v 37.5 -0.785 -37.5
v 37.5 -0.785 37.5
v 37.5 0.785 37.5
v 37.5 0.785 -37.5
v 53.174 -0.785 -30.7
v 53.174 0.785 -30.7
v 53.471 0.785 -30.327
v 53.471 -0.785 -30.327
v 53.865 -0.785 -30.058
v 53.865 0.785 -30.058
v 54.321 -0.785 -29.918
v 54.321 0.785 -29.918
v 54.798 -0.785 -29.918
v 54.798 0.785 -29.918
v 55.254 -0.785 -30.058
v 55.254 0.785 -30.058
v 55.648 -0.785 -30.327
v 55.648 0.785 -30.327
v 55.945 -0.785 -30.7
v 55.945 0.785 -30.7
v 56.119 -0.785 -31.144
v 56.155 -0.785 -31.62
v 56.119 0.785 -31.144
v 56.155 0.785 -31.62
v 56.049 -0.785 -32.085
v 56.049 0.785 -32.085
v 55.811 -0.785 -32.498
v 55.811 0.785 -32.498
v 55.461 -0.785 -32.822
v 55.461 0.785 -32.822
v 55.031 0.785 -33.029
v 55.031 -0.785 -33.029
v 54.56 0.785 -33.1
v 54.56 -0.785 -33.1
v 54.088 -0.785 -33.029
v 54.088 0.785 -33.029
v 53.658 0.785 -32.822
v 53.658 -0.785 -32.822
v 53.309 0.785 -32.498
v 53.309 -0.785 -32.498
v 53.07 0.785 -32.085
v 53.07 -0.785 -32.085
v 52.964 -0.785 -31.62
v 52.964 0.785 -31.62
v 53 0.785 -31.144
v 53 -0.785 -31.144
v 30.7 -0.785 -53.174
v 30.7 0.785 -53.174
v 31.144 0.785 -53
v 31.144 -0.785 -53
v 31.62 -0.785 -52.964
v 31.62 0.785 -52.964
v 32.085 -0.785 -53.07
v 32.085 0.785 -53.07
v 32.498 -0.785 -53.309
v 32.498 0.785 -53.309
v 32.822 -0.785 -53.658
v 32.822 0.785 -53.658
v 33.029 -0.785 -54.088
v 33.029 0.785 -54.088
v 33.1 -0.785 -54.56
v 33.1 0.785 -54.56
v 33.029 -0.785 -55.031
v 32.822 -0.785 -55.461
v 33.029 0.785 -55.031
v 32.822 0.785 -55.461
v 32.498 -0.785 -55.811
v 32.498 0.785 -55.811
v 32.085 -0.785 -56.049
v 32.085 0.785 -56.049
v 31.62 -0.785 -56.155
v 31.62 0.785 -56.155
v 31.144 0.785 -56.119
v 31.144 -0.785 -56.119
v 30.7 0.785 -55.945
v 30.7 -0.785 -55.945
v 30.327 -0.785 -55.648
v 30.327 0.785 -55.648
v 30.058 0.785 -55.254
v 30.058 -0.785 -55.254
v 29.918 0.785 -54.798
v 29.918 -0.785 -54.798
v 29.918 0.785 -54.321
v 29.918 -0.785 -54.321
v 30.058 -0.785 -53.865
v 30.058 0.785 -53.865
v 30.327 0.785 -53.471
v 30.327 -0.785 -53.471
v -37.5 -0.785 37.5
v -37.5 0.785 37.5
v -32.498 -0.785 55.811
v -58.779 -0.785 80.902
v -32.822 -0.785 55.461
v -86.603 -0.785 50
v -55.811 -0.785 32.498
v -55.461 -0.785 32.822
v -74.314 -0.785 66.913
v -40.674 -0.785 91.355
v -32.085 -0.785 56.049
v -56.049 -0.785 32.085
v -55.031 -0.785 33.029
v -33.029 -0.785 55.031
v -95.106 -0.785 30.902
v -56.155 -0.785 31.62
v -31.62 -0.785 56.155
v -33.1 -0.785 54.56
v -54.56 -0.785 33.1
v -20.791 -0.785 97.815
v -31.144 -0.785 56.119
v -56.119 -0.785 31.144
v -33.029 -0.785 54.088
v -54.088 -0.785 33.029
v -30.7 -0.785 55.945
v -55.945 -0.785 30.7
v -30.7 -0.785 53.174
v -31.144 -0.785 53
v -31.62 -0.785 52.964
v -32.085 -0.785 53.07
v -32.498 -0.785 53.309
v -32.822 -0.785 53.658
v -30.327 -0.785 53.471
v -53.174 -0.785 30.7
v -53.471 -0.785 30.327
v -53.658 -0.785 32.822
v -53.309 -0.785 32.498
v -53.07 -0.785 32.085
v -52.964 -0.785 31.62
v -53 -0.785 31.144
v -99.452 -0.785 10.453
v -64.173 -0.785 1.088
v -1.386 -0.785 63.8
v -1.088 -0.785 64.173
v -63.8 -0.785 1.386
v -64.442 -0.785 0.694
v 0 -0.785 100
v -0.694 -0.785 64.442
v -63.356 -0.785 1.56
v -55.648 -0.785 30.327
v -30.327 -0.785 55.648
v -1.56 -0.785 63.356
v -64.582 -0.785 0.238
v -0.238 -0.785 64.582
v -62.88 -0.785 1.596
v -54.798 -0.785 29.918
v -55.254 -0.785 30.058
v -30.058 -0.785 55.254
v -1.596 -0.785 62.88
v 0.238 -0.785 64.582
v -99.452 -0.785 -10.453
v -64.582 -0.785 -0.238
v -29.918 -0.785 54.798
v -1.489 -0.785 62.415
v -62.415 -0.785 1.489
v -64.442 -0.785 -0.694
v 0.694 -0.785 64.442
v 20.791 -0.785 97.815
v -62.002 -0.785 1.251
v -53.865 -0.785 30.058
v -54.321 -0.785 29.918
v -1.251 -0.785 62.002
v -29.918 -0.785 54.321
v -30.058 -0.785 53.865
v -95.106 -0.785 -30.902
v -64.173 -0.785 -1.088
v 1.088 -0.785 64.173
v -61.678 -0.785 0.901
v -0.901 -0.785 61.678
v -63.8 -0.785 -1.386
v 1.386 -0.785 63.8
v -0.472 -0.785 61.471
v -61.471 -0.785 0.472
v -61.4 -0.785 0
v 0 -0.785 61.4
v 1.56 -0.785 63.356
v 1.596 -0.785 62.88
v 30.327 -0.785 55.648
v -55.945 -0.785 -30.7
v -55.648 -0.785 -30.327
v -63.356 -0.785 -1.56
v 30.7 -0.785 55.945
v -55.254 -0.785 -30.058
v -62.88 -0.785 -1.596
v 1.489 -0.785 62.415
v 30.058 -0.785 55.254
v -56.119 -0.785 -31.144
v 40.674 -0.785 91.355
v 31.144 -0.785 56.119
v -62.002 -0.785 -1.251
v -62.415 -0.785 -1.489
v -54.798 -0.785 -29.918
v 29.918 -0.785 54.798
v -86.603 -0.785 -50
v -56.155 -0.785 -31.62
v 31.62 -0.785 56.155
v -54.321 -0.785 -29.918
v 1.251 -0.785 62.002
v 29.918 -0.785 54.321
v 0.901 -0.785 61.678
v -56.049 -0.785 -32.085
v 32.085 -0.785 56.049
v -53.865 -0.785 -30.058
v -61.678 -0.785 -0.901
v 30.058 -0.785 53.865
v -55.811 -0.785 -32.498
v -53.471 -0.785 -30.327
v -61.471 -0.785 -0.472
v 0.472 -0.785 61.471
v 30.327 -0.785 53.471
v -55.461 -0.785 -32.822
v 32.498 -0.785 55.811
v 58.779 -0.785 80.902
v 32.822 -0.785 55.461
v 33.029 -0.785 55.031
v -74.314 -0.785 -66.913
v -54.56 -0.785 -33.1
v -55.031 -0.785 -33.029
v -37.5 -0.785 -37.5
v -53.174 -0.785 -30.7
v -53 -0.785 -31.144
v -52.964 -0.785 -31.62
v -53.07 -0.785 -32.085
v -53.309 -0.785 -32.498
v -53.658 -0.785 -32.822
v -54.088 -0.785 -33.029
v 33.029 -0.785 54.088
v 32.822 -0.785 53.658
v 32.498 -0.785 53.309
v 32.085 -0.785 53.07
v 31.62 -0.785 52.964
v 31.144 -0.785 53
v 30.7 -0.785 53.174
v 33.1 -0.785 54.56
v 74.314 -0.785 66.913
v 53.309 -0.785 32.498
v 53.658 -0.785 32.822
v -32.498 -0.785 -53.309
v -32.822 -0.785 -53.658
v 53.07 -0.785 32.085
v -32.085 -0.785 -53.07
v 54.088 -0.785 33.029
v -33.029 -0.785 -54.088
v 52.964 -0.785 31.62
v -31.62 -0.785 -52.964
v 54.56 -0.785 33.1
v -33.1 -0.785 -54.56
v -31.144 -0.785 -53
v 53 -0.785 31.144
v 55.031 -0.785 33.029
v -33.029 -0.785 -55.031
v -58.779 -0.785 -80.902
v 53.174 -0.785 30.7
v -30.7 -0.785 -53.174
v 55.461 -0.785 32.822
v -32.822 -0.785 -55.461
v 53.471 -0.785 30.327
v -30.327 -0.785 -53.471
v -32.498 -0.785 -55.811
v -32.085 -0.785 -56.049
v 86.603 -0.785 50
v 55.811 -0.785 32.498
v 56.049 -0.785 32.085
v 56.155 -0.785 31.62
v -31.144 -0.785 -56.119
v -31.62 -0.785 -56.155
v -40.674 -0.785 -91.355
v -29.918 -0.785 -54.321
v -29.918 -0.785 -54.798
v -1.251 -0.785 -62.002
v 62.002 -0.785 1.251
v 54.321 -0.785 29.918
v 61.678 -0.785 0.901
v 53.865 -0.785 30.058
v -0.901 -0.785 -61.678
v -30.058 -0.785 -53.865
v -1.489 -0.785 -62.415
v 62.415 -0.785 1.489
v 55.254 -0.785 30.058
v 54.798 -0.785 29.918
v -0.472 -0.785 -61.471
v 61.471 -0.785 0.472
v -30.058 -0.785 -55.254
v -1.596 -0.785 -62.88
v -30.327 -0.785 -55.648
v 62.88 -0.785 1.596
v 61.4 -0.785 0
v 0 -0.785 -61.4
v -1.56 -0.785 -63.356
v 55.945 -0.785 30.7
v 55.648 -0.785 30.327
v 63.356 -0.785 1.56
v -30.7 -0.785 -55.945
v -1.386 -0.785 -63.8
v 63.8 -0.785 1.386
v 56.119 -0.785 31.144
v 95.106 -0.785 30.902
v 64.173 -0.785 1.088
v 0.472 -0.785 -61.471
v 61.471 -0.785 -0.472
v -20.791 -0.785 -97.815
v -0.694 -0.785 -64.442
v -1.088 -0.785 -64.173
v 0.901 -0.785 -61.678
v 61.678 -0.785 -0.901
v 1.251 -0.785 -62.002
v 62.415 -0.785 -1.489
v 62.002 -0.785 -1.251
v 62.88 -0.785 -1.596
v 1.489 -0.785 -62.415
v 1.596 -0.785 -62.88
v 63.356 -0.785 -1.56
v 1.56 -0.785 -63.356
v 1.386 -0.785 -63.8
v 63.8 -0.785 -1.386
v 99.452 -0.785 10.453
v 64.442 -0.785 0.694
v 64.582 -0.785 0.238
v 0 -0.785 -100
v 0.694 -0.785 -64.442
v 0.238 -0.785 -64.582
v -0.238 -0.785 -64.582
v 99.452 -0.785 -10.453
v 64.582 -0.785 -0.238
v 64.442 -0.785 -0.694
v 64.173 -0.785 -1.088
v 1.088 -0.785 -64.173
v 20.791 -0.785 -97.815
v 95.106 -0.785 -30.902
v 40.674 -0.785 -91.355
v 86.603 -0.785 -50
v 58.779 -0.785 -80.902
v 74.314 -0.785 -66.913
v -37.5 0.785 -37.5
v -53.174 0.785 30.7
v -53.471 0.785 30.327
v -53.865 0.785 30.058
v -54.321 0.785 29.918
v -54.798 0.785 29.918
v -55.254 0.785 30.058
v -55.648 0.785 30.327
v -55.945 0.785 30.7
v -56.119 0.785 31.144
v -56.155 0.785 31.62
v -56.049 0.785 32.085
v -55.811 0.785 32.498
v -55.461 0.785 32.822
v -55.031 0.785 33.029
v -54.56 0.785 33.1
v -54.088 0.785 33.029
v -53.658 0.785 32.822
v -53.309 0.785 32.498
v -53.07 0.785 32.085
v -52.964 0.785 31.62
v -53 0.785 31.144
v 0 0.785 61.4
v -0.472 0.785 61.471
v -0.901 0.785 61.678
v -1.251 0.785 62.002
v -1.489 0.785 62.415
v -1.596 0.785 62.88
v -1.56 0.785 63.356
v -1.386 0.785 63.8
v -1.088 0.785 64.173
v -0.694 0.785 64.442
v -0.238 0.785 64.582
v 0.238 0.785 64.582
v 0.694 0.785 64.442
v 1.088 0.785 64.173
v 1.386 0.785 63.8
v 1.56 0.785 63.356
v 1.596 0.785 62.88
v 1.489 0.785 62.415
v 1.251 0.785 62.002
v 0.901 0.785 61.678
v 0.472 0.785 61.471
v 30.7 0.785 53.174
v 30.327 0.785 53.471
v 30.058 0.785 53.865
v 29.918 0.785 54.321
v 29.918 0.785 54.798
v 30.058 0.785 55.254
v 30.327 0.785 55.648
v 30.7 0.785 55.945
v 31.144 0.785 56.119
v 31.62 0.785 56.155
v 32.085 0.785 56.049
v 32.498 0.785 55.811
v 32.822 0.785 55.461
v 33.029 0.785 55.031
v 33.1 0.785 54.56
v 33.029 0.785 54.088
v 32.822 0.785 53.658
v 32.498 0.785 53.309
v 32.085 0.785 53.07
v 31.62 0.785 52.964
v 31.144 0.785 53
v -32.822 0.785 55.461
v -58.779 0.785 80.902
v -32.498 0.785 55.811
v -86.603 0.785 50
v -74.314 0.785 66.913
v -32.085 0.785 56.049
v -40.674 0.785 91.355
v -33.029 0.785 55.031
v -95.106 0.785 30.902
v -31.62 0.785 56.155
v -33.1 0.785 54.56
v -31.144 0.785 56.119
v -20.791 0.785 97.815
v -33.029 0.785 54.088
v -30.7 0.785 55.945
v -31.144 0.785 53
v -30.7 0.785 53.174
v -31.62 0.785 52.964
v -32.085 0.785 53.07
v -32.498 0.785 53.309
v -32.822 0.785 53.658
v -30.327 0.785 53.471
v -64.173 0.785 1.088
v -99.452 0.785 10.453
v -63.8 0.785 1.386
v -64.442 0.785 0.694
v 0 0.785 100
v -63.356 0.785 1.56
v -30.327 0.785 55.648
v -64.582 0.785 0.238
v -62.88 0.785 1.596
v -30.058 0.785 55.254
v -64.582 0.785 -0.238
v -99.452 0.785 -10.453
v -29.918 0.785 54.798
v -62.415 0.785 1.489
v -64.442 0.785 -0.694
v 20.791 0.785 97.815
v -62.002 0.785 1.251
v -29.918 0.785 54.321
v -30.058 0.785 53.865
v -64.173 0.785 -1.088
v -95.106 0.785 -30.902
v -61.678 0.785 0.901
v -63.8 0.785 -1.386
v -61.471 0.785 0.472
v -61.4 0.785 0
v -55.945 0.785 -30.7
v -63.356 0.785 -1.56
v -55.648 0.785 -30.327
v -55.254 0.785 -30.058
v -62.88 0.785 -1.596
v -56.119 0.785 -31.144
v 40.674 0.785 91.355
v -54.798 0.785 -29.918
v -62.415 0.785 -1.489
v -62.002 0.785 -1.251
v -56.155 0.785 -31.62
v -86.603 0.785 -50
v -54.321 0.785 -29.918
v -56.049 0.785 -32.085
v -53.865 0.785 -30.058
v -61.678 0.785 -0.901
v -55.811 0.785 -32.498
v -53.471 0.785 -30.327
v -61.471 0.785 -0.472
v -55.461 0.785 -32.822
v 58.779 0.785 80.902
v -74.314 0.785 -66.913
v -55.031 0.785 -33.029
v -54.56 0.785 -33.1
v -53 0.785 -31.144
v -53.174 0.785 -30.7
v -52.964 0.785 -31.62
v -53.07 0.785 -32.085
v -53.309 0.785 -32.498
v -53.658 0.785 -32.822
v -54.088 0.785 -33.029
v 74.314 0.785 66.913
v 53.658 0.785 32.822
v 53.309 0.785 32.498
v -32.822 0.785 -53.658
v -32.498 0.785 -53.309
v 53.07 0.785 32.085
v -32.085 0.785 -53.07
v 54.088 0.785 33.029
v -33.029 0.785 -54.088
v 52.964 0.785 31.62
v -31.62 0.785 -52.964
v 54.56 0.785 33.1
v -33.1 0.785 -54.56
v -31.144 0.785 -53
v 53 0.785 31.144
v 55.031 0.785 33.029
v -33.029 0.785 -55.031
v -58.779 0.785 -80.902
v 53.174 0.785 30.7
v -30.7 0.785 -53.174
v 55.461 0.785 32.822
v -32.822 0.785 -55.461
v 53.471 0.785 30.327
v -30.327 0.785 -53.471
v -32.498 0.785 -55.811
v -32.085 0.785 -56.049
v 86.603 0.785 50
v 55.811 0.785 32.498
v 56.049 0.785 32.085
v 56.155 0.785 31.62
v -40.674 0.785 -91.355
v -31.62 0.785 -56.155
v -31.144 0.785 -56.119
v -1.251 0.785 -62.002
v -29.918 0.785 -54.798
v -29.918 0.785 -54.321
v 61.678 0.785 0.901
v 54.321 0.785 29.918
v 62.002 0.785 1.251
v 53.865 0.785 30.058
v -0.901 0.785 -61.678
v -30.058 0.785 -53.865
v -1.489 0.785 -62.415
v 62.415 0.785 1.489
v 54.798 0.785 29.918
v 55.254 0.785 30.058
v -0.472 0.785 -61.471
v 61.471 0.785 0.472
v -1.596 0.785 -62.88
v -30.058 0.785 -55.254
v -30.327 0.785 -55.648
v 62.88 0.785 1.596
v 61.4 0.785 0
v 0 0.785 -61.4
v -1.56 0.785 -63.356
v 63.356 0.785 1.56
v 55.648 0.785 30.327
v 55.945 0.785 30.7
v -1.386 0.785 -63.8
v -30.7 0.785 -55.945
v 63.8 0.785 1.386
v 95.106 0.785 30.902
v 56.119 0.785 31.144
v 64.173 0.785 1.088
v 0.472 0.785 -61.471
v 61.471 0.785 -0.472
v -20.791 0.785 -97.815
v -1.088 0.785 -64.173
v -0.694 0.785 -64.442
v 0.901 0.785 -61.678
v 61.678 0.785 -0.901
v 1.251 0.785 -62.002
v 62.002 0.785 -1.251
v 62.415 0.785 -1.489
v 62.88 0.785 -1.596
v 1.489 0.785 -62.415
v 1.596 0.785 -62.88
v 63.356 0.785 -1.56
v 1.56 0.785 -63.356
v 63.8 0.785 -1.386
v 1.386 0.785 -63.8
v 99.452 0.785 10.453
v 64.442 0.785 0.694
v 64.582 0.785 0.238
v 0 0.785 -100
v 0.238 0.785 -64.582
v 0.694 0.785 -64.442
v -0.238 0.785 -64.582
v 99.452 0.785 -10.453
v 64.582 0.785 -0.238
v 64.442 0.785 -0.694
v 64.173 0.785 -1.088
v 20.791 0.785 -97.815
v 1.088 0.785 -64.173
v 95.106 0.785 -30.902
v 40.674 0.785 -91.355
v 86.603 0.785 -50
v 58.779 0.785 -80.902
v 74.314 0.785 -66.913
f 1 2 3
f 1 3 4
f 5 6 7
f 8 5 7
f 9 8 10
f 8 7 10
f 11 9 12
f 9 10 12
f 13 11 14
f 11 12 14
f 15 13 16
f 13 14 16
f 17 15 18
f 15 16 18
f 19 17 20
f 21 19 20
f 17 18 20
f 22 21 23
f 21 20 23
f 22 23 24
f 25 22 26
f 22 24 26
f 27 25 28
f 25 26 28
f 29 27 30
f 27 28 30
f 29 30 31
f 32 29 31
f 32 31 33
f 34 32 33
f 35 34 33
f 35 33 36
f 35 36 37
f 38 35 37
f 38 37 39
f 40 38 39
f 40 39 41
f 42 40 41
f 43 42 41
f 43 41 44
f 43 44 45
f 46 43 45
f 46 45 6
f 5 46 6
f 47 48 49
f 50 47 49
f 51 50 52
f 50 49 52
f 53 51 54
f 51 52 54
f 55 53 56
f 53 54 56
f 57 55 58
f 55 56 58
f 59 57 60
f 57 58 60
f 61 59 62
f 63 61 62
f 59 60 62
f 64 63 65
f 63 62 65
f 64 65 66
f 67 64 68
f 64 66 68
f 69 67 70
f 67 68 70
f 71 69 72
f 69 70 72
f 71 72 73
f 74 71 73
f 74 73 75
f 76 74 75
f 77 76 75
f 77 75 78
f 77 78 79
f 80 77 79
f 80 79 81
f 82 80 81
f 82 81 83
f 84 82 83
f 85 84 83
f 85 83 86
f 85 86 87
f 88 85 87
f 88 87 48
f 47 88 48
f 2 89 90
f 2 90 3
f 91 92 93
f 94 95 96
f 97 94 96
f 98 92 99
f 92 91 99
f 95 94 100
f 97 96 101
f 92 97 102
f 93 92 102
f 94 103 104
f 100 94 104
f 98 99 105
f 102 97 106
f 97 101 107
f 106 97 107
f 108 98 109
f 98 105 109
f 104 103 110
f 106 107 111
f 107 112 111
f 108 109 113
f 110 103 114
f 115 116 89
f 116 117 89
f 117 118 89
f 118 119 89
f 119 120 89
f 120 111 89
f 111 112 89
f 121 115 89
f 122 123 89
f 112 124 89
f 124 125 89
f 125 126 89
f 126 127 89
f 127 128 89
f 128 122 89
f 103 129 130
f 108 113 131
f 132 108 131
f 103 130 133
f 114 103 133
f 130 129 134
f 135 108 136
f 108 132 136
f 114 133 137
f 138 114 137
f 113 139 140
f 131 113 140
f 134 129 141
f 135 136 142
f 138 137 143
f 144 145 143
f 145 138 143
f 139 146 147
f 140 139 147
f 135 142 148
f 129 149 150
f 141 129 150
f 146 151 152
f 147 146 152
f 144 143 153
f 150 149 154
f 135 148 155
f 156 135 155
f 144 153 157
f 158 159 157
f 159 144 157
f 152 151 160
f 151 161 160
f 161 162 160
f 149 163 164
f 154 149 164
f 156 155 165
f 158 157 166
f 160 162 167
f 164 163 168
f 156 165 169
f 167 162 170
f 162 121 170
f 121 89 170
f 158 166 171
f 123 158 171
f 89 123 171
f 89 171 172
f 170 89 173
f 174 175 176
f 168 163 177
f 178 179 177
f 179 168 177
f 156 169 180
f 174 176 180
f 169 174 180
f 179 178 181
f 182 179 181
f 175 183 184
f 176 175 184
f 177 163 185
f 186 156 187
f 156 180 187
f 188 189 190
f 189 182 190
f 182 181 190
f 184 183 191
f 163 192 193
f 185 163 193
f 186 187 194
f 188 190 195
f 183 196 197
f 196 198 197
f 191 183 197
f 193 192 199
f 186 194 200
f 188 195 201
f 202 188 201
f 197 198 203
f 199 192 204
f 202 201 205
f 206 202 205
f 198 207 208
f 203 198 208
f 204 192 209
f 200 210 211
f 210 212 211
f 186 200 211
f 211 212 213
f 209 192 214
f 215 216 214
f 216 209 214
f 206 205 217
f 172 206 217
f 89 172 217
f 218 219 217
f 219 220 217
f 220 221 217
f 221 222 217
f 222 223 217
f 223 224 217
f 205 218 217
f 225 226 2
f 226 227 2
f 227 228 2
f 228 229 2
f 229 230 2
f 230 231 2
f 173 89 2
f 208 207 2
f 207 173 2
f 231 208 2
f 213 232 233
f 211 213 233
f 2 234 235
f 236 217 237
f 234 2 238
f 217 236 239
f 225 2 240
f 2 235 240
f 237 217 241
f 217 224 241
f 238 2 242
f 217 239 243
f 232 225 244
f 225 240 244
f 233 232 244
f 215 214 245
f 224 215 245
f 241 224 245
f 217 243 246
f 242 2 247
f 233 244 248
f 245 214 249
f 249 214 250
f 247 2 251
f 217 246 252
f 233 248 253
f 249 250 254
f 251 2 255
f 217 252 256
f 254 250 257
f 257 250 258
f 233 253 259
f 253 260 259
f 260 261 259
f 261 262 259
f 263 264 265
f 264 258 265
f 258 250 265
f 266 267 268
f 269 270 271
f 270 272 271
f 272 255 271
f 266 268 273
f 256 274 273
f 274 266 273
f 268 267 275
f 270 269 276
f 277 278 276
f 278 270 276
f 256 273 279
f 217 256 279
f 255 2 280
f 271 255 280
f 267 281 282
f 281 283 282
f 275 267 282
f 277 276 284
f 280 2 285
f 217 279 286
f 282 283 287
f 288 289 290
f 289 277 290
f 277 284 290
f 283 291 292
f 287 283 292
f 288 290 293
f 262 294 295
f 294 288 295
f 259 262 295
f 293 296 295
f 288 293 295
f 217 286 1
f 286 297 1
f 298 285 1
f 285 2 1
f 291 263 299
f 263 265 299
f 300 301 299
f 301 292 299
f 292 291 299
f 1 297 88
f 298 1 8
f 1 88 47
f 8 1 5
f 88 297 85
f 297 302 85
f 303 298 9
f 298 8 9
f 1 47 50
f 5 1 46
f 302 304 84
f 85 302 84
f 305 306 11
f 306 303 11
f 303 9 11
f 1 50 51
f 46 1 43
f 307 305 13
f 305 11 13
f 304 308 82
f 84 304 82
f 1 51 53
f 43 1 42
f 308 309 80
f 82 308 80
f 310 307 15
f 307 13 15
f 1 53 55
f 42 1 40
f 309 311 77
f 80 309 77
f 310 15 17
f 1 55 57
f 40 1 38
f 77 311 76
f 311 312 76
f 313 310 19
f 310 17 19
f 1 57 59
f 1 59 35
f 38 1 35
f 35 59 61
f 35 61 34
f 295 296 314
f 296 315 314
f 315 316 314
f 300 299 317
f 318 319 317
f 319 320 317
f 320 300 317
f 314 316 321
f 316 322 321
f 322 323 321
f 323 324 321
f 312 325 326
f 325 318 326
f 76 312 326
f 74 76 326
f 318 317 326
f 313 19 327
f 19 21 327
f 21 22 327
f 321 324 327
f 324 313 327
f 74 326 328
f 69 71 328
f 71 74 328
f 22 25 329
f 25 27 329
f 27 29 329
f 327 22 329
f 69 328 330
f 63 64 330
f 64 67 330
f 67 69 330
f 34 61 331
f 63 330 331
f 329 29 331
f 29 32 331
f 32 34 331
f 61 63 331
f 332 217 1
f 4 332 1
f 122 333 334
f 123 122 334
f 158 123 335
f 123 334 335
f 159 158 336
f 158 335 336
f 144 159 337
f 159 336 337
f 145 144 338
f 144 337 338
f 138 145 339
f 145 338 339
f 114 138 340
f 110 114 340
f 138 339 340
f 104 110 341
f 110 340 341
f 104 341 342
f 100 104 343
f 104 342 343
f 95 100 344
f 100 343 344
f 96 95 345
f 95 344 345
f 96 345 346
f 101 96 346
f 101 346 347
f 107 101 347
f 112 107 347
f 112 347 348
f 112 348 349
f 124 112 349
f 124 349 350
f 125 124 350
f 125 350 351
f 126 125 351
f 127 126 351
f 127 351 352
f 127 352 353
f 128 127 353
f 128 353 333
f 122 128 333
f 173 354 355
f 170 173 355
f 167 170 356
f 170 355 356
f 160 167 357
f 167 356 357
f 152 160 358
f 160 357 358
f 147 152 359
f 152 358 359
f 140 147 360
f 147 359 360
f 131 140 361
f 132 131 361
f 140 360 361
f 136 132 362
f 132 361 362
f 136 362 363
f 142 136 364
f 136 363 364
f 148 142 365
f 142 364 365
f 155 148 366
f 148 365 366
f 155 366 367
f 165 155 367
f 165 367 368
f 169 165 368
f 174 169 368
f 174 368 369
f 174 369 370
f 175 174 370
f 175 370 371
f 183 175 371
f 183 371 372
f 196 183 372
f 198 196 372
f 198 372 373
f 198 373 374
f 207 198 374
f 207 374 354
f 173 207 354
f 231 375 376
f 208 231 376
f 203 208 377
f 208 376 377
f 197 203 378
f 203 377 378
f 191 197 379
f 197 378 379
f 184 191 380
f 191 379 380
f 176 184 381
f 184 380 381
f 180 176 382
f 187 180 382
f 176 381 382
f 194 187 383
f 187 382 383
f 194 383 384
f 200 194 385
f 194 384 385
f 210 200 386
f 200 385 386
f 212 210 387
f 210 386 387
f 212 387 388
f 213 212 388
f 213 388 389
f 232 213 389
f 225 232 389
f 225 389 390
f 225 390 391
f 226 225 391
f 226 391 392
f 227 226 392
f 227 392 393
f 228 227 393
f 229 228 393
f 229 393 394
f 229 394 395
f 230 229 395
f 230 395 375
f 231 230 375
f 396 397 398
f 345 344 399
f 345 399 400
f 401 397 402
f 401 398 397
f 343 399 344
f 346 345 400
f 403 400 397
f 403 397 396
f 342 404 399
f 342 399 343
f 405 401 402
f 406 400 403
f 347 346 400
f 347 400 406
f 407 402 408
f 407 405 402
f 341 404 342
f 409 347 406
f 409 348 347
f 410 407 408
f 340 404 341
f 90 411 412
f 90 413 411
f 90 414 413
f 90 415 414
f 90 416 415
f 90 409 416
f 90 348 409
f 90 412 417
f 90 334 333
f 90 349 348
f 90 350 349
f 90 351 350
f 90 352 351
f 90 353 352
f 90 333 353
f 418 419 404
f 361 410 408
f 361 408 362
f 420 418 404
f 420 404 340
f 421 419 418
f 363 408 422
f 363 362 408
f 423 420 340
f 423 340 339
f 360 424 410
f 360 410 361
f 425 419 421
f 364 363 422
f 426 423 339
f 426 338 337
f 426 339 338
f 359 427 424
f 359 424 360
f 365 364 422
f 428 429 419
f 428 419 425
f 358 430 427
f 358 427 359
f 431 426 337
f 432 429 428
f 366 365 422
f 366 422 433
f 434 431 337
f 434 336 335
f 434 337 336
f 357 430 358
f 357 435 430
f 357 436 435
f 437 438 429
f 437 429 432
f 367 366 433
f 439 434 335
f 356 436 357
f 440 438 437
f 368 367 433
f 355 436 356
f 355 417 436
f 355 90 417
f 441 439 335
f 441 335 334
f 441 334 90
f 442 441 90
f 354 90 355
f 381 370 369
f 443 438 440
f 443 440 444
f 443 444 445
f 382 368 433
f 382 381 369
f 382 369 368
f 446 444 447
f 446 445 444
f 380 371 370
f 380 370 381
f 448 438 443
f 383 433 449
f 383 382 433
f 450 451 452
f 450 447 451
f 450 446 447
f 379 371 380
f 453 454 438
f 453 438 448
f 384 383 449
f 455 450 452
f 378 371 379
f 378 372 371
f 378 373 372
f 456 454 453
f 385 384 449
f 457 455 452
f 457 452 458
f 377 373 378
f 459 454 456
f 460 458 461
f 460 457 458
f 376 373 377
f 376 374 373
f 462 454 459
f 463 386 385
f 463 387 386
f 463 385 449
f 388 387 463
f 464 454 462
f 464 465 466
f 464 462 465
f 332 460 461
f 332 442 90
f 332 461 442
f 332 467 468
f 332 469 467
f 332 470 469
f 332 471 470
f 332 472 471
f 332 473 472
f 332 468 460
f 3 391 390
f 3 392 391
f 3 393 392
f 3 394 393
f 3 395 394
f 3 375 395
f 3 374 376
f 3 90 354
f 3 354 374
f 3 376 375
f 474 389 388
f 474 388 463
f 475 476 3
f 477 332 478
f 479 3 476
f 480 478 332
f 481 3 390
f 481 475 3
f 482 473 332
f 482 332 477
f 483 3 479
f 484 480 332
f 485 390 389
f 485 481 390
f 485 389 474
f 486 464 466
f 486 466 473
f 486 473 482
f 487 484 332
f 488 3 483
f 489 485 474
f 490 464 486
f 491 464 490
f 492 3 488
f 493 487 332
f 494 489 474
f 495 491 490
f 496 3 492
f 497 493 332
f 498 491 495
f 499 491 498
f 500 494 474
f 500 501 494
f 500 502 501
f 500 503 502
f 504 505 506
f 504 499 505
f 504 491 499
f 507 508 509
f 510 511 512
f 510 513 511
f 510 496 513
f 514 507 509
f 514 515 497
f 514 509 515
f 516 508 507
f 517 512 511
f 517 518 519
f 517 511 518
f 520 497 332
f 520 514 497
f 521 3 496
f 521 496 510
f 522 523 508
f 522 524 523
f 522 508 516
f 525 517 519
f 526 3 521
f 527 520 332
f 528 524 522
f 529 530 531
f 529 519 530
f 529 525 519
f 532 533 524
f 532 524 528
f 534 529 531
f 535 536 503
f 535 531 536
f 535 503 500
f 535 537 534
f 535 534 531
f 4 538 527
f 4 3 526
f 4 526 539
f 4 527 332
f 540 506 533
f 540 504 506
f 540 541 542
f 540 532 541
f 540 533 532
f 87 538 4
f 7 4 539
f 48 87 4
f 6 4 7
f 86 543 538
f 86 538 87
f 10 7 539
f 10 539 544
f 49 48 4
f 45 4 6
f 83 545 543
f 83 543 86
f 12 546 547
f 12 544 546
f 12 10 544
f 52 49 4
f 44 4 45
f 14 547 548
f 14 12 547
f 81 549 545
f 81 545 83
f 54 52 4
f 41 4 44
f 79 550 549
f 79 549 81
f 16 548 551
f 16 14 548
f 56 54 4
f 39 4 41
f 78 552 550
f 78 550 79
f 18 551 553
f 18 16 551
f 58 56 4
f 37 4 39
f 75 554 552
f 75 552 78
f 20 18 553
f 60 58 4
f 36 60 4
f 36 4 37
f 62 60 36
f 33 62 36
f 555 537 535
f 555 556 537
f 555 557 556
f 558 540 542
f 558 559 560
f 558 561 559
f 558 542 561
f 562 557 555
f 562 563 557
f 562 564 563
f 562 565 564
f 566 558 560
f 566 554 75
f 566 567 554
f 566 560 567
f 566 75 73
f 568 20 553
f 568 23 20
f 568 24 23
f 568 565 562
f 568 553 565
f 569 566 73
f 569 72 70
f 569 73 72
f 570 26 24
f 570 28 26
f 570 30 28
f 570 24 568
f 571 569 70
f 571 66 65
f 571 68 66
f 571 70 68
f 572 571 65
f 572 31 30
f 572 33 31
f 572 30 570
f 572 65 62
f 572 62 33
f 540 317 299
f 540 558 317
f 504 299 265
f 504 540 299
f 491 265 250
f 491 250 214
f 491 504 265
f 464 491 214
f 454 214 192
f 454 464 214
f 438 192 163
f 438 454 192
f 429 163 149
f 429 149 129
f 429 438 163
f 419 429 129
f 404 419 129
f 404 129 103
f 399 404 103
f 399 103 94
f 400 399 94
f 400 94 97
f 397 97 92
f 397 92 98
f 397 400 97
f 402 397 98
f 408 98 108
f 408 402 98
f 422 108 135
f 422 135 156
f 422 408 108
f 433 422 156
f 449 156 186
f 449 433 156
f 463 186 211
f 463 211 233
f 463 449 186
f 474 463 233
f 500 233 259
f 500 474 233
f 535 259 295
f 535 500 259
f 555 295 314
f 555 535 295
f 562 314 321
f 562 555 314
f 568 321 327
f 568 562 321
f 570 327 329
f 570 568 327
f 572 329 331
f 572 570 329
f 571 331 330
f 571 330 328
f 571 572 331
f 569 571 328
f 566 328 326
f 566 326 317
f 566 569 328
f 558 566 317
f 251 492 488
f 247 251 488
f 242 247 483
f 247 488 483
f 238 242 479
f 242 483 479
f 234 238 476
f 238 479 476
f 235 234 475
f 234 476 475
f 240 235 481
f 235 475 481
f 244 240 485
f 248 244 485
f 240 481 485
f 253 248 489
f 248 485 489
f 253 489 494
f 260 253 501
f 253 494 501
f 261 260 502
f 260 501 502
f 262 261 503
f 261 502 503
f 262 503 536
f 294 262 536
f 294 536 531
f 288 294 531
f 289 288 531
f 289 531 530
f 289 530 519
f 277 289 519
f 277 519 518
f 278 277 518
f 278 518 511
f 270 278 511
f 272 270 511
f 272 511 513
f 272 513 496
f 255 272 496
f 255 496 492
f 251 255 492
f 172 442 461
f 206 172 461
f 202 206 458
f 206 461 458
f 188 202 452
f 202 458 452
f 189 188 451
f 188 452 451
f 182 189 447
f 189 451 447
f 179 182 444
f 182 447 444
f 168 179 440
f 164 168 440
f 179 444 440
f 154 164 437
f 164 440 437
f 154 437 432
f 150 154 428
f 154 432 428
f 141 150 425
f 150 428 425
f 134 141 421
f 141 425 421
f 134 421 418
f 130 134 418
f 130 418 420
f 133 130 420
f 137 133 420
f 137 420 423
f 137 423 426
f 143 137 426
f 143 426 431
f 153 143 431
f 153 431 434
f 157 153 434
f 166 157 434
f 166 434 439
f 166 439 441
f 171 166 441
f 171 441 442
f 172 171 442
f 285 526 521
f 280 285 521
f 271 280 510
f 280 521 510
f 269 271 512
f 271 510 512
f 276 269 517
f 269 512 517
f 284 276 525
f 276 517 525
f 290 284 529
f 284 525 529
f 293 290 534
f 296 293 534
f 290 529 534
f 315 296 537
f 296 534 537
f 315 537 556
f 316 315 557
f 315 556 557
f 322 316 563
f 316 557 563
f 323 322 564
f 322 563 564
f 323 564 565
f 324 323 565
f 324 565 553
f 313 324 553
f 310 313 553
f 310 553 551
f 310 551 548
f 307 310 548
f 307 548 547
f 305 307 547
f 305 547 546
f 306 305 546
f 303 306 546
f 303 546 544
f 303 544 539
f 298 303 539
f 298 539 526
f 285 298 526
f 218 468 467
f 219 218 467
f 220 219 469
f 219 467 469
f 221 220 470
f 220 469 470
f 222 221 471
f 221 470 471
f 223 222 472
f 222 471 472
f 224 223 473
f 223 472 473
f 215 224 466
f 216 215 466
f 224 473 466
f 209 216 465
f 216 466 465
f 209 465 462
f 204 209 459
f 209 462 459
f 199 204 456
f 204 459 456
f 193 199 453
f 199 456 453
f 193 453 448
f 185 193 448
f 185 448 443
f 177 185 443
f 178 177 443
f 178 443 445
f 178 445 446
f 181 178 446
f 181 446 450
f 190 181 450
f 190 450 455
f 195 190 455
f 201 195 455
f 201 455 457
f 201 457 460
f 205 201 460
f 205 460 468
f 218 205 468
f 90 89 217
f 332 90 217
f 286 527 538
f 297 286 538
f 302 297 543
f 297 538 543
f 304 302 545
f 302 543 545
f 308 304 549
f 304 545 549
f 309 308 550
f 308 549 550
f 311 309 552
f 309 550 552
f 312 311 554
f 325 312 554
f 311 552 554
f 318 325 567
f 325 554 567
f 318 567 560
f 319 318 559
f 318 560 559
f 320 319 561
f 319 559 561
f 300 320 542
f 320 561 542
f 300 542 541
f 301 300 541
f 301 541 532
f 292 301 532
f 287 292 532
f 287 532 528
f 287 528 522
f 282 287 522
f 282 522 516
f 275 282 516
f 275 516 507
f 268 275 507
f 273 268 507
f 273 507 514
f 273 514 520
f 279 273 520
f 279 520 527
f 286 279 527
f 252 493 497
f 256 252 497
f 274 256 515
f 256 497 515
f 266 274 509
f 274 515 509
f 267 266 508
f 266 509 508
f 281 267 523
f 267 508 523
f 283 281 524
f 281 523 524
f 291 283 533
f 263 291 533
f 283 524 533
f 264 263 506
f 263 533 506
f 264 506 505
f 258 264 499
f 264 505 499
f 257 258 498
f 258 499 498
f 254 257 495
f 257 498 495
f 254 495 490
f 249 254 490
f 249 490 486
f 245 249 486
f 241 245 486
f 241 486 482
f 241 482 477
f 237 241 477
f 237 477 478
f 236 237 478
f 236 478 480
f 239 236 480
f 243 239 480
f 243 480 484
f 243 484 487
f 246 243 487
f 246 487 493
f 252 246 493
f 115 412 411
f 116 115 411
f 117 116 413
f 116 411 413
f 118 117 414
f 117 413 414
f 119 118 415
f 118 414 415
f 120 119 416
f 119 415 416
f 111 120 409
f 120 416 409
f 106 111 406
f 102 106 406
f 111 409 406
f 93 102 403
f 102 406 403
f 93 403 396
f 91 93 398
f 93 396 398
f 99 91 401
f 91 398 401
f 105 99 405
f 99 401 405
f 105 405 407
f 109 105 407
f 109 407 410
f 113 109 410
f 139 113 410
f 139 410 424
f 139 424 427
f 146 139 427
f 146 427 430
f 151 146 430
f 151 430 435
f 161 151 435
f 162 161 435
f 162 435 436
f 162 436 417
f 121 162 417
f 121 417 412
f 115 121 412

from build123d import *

# Parameters (mm, degrees)
SKETCH1_W           = 40
SKETCH1_H           = 1.57
BOSS_EXTRUDE1_START = -1.57
SKETCH2_R           = 60
SKETCH2_W           = 75
SKETCH2_H           = 75
BOSS_EXTRUDE1_DEPTH = 1.57
SKETCH3_R           = 1.6
CUT_EXTRUDE1_DEPTH  = 142.430070706
CIRPATTERN1_COUNT   = 12


with BuildPart() as part:
    # Sketch1 → Revolve1 (revolve)
    with BuildSketch(Plane.XY, mode=Mode.PRIVATE) as revolve1_sk:
        with Locations((-80, 0)):
            Rectangle(SKETCH1_W, SKETCH1_H)
    revolve(revolve1_sk.sketch.rotate(Axis((0, -200069.047495165, 0), (0, 1, 0)), 270), axis=Axis((0, -200069.047495165, 0), (0, 1, 0)))

    # Sketch2 → Boss-Extrude1 (add)
    with BuildSketch(Plane(origin=(0, 0.785, 0), x_dir=(1, 0, 0), z_dir=(0, 1, 0)).offset(BOSS_EXTRUDE1_START)):
        Circle(SKETCH2_R)
        Rectangle(SKETCH2_W, SKETCH2_H, mode=Mode.SUBTRACT)
    extrude(amount=BOSS_EXTRUDE1_DEPTH)

    # Sketch3 → Cut-Extrude1 (cut, through all)
    with BuildSketch(Plane(origin=(0, 0.785, 0), x_dir=(1, 0, 0), z_dir=(0, 1, 0))):
        with Locations(Location((0, 63, 0), (0, 0, 270))):
            Circle(SKETCH3_R)
    cut_extrude1 = extrude(amount=-CUT_EXTRUDE1_DEPTH, mode=Mode.SUBTRACT)

    # CirPattern1: Cut-Extrude1 ×12 about axis
    cirpattern1_axis = Axis((0, 0, 0), (0, 1, 0))
    for i in range(1, CIRPATTERN1_COUNT):
        add(cut_extrude1.rotate(cirpattern1_axis, i * 360 / CIRPATTERN1_COUNT), mode=Mode.SUBTRACT)


solid = part.part
